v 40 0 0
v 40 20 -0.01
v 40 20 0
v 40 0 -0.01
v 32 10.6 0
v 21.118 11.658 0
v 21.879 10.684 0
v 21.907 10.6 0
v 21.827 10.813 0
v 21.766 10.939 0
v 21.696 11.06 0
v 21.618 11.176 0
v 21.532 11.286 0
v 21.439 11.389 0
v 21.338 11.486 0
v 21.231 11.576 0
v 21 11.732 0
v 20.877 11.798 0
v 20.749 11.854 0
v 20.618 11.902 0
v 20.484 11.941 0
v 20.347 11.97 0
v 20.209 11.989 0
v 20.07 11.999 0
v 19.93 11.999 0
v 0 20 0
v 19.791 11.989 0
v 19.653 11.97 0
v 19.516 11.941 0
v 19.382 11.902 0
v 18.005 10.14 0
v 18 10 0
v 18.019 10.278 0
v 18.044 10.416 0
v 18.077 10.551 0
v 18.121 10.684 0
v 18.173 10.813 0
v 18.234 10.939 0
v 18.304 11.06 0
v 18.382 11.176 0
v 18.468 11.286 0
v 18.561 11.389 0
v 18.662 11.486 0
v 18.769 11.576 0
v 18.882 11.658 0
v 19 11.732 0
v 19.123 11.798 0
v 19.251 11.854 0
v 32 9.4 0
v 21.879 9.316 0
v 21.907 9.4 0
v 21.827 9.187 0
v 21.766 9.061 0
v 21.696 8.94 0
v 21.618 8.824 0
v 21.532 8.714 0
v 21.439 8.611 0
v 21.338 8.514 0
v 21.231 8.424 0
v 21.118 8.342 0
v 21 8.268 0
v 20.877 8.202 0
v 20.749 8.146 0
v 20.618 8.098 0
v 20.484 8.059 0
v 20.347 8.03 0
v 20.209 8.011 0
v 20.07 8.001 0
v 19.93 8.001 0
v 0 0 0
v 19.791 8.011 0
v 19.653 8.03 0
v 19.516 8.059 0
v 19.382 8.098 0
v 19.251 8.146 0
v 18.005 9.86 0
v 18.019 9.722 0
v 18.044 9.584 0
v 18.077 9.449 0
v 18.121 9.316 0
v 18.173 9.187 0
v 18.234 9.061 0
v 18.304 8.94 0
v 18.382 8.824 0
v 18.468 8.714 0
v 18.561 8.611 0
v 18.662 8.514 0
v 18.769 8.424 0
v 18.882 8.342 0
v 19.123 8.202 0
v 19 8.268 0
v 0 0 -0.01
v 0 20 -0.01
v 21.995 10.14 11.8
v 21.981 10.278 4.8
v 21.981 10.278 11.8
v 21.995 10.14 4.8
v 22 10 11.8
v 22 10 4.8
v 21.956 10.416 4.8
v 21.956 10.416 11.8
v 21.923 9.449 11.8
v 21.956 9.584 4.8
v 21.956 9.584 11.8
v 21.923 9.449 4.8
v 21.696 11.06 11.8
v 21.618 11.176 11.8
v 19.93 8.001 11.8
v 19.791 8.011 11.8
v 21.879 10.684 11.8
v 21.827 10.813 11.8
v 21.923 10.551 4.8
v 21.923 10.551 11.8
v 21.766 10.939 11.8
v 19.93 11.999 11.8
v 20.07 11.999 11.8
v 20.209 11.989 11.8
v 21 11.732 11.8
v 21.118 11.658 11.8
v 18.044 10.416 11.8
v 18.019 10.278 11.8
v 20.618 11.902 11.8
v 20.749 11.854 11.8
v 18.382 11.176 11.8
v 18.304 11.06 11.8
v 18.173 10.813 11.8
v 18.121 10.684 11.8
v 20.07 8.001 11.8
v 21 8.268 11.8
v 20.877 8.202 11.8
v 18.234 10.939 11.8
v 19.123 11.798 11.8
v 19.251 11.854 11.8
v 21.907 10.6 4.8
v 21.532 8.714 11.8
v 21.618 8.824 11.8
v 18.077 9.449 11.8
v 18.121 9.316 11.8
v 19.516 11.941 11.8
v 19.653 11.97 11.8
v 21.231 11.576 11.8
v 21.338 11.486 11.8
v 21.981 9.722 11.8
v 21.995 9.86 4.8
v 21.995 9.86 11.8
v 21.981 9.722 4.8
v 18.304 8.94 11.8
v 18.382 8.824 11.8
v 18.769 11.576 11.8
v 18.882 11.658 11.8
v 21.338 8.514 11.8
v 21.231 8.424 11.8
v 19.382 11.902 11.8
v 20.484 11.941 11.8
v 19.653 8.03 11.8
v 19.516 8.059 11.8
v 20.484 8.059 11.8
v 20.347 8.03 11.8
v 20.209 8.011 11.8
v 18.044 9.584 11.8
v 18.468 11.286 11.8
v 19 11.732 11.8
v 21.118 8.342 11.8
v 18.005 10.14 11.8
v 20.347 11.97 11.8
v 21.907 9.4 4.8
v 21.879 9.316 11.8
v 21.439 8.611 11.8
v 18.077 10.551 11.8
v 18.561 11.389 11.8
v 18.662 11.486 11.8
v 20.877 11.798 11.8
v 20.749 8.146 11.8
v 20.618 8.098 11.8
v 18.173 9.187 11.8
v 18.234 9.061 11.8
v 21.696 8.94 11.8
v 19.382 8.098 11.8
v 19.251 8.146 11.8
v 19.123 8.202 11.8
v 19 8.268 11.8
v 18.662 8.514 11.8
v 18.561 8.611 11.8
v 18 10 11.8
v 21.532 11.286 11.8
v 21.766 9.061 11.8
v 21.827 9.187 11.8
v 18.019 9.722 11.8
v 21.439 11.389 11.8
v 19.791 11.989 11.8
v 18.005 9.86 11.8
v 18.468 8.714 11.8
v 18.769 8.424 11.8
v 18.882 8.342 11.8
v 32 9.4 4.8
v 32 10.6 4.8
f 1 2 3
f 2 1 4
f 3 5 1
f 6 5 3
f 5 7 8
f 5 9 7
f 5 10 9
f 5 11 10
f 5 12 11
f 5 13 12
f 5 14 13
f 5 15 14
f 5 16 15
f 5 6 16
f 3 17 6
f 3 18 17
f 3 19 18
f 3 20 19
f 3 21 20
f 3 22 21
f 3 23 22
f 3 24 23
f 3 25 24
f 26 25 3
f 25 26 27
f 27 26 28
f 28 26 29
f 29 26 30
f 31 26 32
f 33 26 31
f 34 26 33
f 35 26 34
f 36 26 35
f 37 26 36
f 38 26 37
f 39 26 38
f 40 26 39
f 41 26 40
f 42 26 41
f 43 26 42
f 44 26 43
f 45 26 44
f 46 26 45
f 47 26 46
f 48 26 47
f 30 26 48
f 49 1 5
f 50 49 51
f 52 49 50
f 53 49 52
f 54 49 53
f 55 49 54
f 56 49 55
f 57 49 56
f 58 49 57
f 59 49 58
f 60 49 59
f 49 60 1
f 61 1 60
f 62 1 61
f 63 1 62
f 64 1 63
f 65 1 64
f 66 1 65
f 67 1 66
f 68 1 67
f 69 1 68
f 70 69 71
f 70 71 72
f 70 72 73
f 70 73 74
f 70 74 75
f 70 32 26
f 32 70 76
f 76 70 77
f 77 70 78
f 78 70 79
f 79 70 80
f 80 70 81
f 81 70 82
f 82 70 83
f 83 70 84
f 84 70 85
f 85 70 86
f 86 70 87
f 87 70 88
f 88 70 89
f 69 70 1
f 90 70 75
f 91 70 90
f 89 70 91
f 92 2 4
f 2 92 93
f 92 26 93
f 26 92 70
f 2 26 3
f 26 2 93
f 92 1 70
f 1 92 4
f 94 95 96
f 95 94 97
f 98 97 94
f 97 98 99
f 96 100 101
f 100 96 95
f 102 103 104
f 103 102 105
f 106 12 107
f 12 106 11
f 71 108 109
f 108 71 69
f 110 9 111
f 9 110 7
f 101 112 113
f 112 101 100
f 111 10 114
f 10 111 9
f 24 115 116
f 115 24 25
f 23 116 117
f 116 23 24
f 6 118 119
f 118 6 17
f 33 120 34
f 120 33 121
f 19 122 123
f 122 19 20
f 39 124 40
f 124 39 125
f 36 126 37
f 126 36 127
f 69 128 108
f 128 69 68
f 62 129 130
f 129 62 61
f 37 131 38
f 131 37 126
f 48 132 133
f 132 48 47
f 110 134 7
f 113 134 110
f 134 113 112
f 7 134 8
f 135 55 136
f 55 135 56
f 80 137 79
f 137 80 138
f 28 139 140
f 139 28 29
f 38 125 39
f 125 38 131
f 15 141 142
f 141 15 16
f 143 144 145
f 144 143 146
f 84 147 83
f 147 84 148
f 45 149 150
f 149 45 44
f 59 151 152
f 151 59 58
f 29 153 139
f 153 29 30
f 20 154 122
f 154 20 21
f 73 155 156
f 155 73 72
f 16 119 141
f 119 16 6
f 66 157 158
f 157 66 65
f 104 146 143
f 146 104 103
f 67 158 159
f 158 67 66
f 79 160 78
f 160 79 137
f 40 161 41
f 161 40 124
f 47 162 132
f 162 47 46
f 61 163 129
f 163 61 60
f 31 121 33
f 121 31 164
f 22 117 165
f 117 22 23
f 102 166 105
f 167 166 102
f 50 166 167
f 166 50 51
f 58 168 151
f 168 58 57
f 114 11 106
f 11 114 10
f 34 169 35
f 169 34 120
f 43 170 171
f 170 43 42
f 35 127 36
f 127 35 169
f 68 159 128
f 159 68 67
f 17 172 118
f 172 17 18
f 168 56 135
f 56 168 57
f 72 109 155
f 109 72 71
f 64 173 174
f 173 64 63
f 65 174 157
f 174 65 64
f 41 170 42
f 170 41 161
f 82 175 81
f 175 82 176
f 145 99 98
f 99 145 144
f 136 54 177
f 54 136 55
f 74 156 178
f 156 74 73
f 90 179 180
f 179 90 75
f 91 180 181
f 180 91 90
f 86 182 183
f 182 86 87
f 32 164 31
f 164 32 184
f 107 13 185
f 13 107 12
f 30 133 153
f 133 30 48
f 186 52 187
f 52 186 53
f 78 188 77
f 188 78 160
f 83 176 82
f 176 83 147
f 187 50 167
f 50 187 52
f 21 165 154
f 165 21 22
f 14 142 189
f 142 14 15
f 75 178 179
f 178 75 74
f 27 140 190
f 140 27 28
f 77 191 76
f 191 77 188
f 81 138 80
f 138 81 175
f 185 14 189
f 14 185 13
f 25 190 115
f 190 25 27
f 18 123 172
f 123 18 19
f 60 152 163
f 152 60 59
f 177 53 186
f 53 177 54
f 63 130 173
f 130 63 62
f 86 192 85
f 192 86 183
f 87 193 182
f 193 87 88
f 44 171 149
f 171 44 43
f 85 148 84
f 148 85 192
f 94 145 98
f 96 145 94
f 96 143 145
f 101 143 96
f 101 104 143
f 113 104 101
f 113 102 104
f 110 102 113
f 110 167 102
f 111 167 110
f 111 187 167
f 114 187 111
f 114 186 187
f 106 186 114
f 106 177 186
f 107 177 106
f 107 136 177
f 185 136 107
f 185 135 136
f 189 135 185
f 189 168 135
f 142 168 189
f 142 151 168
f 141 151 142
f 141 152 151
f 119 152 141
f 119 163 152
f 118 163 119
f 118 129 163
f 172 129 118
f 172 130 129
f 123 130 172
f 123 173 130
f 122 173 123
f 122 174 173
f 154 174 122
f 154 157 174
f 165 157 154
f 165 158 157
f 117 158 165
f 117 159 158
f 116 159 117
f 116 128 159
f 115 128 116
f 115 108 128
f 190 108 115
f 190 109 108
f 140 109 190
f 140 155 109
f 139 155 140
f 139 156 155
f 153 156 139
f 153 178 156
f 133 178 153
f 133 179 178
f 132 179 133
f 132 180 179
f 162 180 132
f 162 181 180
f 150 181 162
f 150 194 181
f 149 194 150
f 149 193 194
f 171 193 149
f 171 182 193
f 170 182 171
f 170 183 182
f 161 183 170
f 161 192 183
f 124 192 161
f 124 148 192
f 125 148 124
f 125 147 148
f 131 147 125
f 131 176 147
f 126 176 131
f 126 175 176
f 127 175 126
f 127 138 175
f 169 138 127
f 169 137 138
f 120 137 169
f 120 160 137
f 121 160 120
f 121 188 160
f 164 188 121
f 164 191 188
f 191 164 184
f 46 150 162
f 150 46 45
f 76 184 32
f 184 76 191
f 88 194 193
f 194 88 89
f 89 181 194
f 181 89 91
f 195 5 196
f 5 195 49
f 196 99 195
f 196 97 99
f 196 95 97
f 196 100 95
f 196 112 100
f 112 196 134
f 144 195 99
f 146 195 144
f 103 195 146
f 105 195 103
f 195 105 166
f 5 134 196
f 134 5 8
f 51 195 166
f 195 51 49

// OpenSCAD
// file: ../Base/PlacementOptions.scad
// Fischertechnik Box Foundation
// Placement Options

// Alignment
NoAlign = 0;
AlignLeft = 1;
AlignBottom = 2;
AlignCenter = 3;
AlignRight = 4;
AlignTop = 5;

// Element rotation degree steps
rotations = [0, -90, -180, -270];

// Rotation
NoRotation = 0;
Rotate0 = 0;
Rotate90 = 1;
Rotate180 = 2;
Rotate270 = 3;

// Docking (seen from above)
NoDock = -1;
DockLeft = 0;
DockTop = 1;
DockRight = 2;
DockCorner = 2;
DockBottom = 3;

// Web corners
LowerLeft = 0;
UpperLeft = 1;
UpperRight = 2;
LowerRight = 3;

// Web position relative to corner
LeftOfCorner = 0;
RightOfCorner = 1;
// file: ../Base/Boxes.scad
// Fischertechnik Box Foundation
// Pre-designed Boxes

use <Constants.scad>

include <PlacementOptions.scad>

box190Width = 190;
box190Depth = 130;
box130Width = 130;
box130Depth = 95;
boxUsageHeight = 33.9;
boxWallThickness = 2.4;
boxBaseThickness = 1.0;

// getBoxWallThickness()
// Gets the wall thickness of a Fischertechnik Box

function getBoxWallThickness() = boxWallThickness;

// Gets the usable height of a fischertechnik box
function getBoxUsageHeight() = boxUsageHeight;

// Gets the thickness of the Fischertechnik box base.
function getBoxBaseThickness() = boxBaseThickness;

// Gets the usable inner space of a Box 190 as an x/y-list
function getBox190Space() = [
    box190Width - 2*getBoxWallThickness(), 
    box190Depth - 2*getBoxWallThickness() ];

// Imports the Fischertechnik empty box 130x190 mm and places it at position 0,0
// 190x130 are the outer sizes, the inner space is slightly smaller. Use getBox190Space() to get the inner sizes.
// This module needs the STL file "Fischertechnik Box 130x190.stl" in the library path.
// The box is positioned that the usable inner space is at the 0,0,0 position. The

module Box190() {
    translate([-getBoxWallThickness(),-getBoxWallThickness(),-getBoxBaseThickness()])
        import("Fischertechnik Box 130x190.stl", convexity=3);
}

// Gets the usable inner space of a Box 130 as an x/y-list
function getBox130Space() = [
    box130Width - 2*getBoxWallThickness(), 
    box130Depth - 2*getBoxWallThickness() ];

// Imports the Fischertechnik empty box 95x130 mm and places it at position 0,0
// 190x130 are the outer sizes, the inner space is slightly smaller. Use getBox190Space() to get the inner sizes.
// This module needs the STL file "Fischertechnik Box 95x130.stl" in the library path.
// The box is positioned that the usable inner space is at the 0,0,0 position. The

module Box130() {
    translate([-getBoxWallThickness(),-getBoxWallThickness(),-getBoxBaseThickness()])
        import("Fischertechnik Box 95x130.stl", convexity=3);
}

// Creates a web at the specified box walls
// corner 0 = LowerLeft, 1 = UpperLeft, 2 = UpperRight, 3 = LowerRight
// side 0 = LeftOfCorner, 1 = RightOfCorner
// distance = Distance in mm from the corner
// box = inner width and depth of the box (default: Box 190)
// webWidth = length of the web (default is 3 mms)
// webThickness = thickness of the web (default is 1 mm)

module BoxWeb(corner, side, distance, box=getBox190Space(), webWidth=3, webThickness=1.0) {
    sink = getBoxWallThickness()/2;

    width = (corner % 2 == 0) ? 
            (side == LeftOfCorner ? webWidth : webThickness) :
            (side == LeftOfCorner ? webThickness : webWidth);

    depth = (corner % 2 == 0) ? 
            (side == RightOfCorner ? webWidth : webThickness) :
            (side == RightOfCorner ? webThickness : webWidth);
    
    xDiff = corner == LowerLeft ? 
                (side == LeftOfCorner ? -sink : distance) :
            (corner == UpperLeft ?                
                (side == LeftOfCorner ? distance : -sink) :
            (corner == UpperRight ?
                (side == LeftOfCorner ? box.x-webWidth+sink : box.x-distance-webThickness) :
                (side == LeftOfCorner ? box.x-distance-webThickness: box.x-webWidth+sink)));

    yDiff = corner == LowerLeft ? 
                (side == RightOfCorner ? -sink : distance) :
            (corner == UpperLeft ?
                (side == RightOfCorner ? box.y-distance : box.y-webWidth+sink) :
            (corner == UpperRight ?
                (side == RightOfCorner ? box.y-webWidth+sink : box.y-distance) :
                (side == RightOfCorner ? distance : -sink)));
    
    translate([xDiff, yDiff, -getExcess()])
        cube([width, depth, boxUsageHeight + 2*getExcess()]);
}
// file: ../Base/Rotation.scad
// Fischertechnik Box Foundation
// Geometry Helpers Rotation

include <PlacementOptions.scad>

// getRotatedSpace(space, rotation=NoRotation)
// Rotates the space dependent on the specified rotation

function getRotatedSpace(space, rotation=NoRotation) = [
    (rotation == Rotate90 || rotation == Rotate270) ? space.y : space.x,
    (rotation == Rotate90 || rotation == Rotate270) ? space.x : space.y
];

// Rotates the given space around the fixed left lower corner
// space = the space the children needs as width/depth list [width,depth]
// rotation = 0 Rotate0 degrees, 1 Rotate90 degrees, 2 Rotate180 degrees, 3 Rotate270 degrees (equivalent to -90)

module RotateFix(space, rotation=Rotate0) {
    dy = (rotation == Rotate0 || rotation == Rotate270) ? 0 :
        (rotation == Rotate90) ? space.x :
        space.y;
    dx = (rotation < Rotate180) ? 0 :
        (rotation == Rotate180) ? space.x :
        space.y;
    
    translate([dx, dy, 0])
        rotate([0, 0, rotations[rotation]])
            children();
}
// file: ../Base/Alignment.scad
// Fischertechnik Box Foundation
// Geometry Helpers Alignment

include <PlacementOptions.scad>

// getAlignedX(elementWidth, spaceWidth, align=AlignRight, offset=0)
// Gets the aligned X offset of an element with the given
// width in the given space.
// elementWidth = The width of the element to positon
// spaceWidth = The space where the element should be aligned
// align = 0 AlignLeft, 1 AlignCenter, 2 AlignRight
// offset = an optional offset from the aligned position. When
// aligned left or centered, then positive values are in X direction.
// When aligned right then positive values are in negative X direction.

function getAlignedX(elementWidth, spaceWidth, align=AlignRight, offset=0) =
    (align == AlignLeft) ?
        offset :
        ((align == AlignCenter) ?
        (spaceWidth - elementWidth)/2 + offset :
        spaceWidth - offset - elementWidth);

// getAlignedY(elementDepth, spaceDepth, align=AlignTop, offset=0)
// Gets the aligned Y offset of an element with the given
// depth in the given space.
// elementDepth = The depth of the element to positon
// spaceDepth = The space where the element should be aligned
// align = 0 AlignBottom, 1 AlignCenter, 2 AlignTop
// offset = an optional offset from the aligned position. When
// aligned bottom or centered, then positive values are in Y direction.
// When aligned top then positive values are in negative Y direction.

function getAlignedY(elementDepth, spaceDepth, align=AlignTop, offset=0) =
    (align == AlignBottom) ?
        offset :
        ((align == AlignCenter) ?
        (spaceDepth - elementDepth)/2 + offset :
        spaceDepth - offset - elementDepth);
// file: ../Base/Placement.scad
// Fischertechnik Box Foundation
// Geometry Helpers Placement

use <Constants.scad>
use <Alignment.scad>
use <Rotation.scad>
use <Boxes.scad>

include <PlacementOptions.scad>

// Place(x=0, y=0, elementSpace=[0,0], alignX=AlignLeft, alignY=AlignBottom, rotation=Rotate0, boxSpace=getBox190Space())
// Places the child at the specified position
// y = Y-Position. This is a relative position when an X aligment is specified.
// x = X-Position. This is a relative position when an Y aligment is specified.
// elementSpace = space of the element to be placed [x,y]
// alignX = -1=NoAlign, 0 AlignLeft, 1 AlignCenter, 3 AlignRight (elementSpace and boxSpace required!)
// alignY = -1=NoAlign, 2 AlignBottom, 1 AlignCenter, 4 AlignTop (elementSpace and boxSpace required!)
// rotation = 0 Rotate0 0 degrees, 1 Rotate90 90 degrees, 
// 2 Rotate180 180 degrees, 3 Rotate270 270 degrees (equivalent to -90)
// boxSpace = Inner space of the box where the placement occurs [x,y] - default is Box 190x130 inner space

module Place(x=0, y=0, elementSpace=[0,0], 
  alignX=AlignLeft, alignY=AlignBottom, 
  rotation=NoRotation, boxSpace=getBox190Space()) {

    module Position(x, y, space, rotation=Rotate0) {
        translate([x, y, 0])
            RotateFix(space, rotation)
                children(0);
    }

    space = getRotatedSpace(elementSpace, rotation);
    alignedX = getAlignedX(space.x, boxSpace.x, alignX, x);
    alignedY = getAlignedY(space.y, boxSpace.y, alignY, y);
    Position(alignedX, alignedY, elementSpace, rotation)
        children(0);
}

// Center(space=getBox130Space(), elementSpace=[0,0])
// space = Space where the children is centered. For cylinder use centered=true and no elementSpace.
// elementSpace = space of the element to be centered [x,y]

module Center(space=getBox190Space(), elementSpace=[0,0]) {
    translate([(space.x - elementSpace.x) / 2, (space.y - elementSpace.y) / 2])
        children(0);
}

// CenterHorizontal(width=0, y=0, offset=0, space=getBox130Space())
// space = Space where the children is centered. For cylinder use centered=true and no elementSpace.
// elementSpace = space of the element to be centered [x,y]

module CenterHorizontal(width=0, y=0, offset=0, space=getBox190Space()) {
    translate([(space.x - width) / 2 + offset, y])
        children(0);
}

// CenterVertical(depth=0, x=0, offset=0, space=getBox130Space())
// space = Space where the children is centered. For cylinder use centered=true and no elementSpace.
// elementSpace = space of the element to be centered [x,y]

module CenterVerticalal(depth=0, x=0, offset=0, space=getBox190Space()) {
    translate([x, (space.y - depth) / 2 + offset])
        children(0);
}
// file: ../Base/Constants.scad
// Fischertechnik Box Foundation
// Constants

// Constant values necessary for multiple elements

// Base constants
dividerThickness = 1.2;
excess = 0.01;
fragments = 90;
tolerance = 0.8;

// Gets the thickness of a divider 
function getDividerThickness() = dividerThickness;

// Gets the excess that is used to merge walls into each other
function getExcess() = excess;

// Gets amount of fragments of a cylinder
function getFragments() = fragments;

// Gets the inner tolerance of a frame to each side
function getTolerance() = tolerance;


// Fischertechnik specific constants
axisDiameter = 4;
axisBottomDiameter = axisDiameter + 1;
standardEdgeDistance = 2.5;
standardWebDistance = 11.5;
standardCornerLength = 15;
tubeWallFactor = 1.6;

// Gets axis diameter
function getAxisDiameter() = axisDiameter;

// Gets axis bottom diameter for thicker part at the bottom
function getAxisBottomDiameter() = axisBottomDiameter;

// gets the standard distance to the wall of the box for dockable frames with webs
function getStandardEdgeDistance() = standardEdgeDistance;

// gets the standard distance of each web to the corner of the dockable frame
function getStandardWebDistance() = standardWebDistance;

// gets the standard length of the corner walls of a dockable frame
function getStandardCornerLength() = standardCornerLength;

// gets the wall thickness of a tube.
function getTubeWallThickness() = tubeWallFactor * getDividerThickness();
// main file
// Fischertechnik Box Library
// Axis for Hand Crank
// 31026

use <../Base/Constants.scad>
use <../Base/Placement.scad>
use <../ModelBase/Simple.scad>

width = 40;
depth = 20;

// getAxisHandCrankSpace()
// Gets the space the hand crank needs as width (.x and .y as a list)

function getAxisHandCrankSpace() = [width, depth];

// AxisHandCrank()
// Axis to stick a hand crank on it. This needs
// a 20x40 mm rectangle in the box. To support the placement
// the axis has a thin and sinked 20x40 mm base plate.

module AxisHandCrank() {
    axisHeight = 11.8;
    AxisWithSpace(axisHeight, getAxisHandCrankSpace());
    
    webLength = 10 + getAxisDiameter() / 2;
    webDepth = getDividerThickness();
    webHeight = 4.8;
    Center(getAxisHandCrankSpace(), [0, webDepth])
        Wall([webLength, webDepth, webHeight]);
}

// Test
color("lightgray") {
AxisHandCrank();
}
